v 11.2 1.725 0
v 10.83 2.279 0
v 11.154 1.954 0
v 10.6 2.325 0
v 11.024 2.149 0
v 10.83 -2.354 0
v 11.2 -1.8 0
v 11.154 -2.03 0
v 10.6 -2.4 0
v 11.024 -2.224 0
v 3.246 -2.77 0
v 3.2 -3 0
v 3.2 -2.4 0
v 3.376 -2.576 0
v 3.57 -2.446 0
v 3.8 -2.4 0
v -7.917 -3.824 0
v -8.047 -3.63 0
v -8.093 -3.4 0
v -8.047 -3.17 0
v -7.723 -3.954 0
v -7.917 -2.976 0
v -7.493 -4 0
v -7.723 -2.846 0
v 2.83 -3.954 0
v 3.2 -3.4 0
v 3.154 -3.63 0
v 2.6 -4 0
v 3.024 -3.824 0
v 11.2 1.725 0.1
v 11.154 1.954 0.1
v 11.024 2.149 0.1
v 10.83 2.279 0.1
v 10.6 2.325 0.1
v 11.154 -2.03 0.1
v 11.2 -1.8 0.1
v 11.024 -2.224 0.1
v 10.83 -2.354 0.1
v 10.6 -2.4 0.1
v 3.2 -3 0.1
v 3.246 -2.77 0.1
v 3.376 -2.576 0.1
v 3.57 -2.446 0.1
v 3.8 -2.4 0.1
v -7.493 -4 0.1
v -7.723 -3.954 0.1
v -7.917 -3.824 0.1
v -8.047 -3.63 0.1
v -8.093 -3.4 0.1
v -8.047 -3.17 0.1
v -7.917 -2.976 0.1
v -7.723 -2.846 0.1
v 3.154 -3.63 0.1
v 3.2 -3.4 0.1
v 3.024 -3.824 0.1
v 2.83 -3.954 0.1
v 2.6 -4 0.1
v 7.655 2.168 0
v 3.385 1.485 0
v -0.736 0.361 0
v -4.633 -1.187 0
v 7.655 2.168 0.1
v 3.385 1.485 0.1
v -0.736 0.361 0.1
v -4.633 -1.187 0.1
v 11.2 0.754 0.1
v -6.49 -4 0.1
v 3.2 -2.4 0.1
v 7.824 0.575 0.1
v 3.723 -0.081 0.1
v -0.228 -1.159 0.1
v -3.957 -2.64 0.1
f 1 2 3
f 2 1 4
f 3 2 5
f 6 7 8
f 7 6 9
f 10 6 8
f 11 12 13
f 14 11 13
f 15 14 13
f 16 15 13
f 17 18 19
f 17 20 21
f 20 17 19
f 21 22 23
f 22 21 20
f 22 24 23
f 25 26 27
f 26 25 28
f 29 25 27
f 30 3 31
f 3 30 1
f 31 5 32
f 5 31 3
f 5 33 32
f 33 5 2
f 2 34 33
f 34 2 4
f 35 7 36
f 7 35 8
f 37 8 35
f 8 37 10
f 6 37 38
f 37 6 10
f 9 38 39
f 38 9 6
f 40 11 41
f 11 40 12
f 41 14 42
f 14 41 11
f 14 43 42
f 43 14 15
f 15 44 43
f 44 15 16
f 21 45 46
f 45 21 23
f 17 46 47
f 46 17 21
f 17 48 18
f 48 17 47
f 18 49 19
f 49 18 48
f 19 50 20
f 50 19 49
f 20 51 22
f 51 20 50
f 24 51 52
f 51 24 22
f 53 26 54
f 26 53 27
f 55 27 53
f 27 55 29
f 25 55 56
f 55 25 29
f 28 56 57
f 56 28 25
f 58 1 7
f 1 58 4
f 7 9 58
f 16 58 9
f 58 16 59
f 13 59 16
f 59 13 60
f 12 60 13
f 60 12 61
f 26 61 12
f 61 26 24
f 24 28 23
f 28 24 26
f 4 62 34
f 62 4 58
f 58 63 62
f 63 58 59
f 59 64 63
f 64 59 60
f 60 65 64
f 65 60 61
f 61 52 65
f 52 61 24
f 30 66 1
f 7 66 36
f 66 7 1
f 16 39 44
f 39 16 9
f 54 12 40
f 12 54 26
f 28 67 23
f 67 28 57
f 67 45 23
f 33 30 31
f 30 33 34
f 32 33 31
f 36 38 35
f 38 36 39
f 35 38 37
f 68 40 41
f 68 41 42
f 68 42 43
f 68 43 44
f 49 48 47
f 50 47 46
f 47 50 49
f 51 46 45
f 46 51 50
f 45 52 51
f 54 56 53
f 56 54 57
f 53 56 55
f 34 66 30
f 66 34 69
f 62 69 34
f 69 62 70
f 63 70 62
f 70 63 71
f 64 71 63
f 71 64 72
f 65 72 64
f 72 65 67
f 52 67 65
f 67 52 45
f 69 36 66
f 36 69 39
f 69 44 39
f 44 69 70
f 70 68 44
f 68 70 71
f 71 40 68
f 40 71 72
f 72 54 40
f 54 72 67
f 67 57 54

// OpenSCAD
// file: ../p/7-16cyli.scad
use <../lib.scad>
function ldraw_lib__7_16cyli() = [
// 0 Cylinder 0.4375
// 0 Name: 7-16cyli.dat
// 0 Author: Magnus Forsberg [MagFors]
// 0 !LDRAW_ORG Primitive UPDATE 2024-01
// 0 !LICENSE Licensed under CC BY 4.0 : see CAreadme.txt
// 
// 0 BFC CERTIFY CCW
  [0,"BFC","CERTIFY"],
  [0,"BFC","CCW"],
// 
// 0 !HISTORY 2009-05-02 [PTadmin] Official Update 2009-01
// 0 !HISTORY 2024-01-03 [MagFors] Complete regeneration, original by guyvivan
// 0 !HISTORY 2024-01-29 [OrionP] Official Update 2024-01
// 
// 4 16 0.9239 0 0.3827 1 0 0 1 1 0 0.9239 1 0.3827
  [4,16,0.9239,0,0.3827,1,0,0,1,1,0,0.9239,1,0.3827],
// 4 16 0.7071 0 0.7071 0.9239 0 0.3827 0.9239 1 0.3827 0.7071 1 0.7071
  [4,16,0.7071,0,0.7071,0.9239,0,0.3827,0.9239,1,0.3827,0.7071,1,0.7071],
// 4 16 0.3827 0 0.9239 0.7071 0 0.7071 0.7071 1 0.7071 0.3827 1 0.9239
  [4,16,0.3827,0,0.9239,0.7071,0,0.7071,0.7071,1,0.7071,0.3827,1,0.9239],
// 4 16 0 0 1 0.3827 0 0.9239 0.3827 1 0.9239 0 1 1
  [4,16,0,0,1,0.3827,0,0.9239,0.3827,1,0.9239,0,1,1],
// 4 16 -0.3827 0 0.9239 0 0 1 0 1 1 -0.3827 1 0.9239
  [4,16,-0.3827,0,0.9239,0,0,1,0,1,1,-0.3827,1,0.9239],
// 4 16 -0.7071 0 0.7071 -0.3827 0 0.9239 -0.3827 1 0.9239 -0.7071 1 0.7071
  [4,16,-0.7071,0,0.7071,-0.3827,0,0.9239,-0.3827,1,0.9239,-0.7071,1,0.7071],
// 4 16 -0.9239 0 0.3827 -0.7071 0 0.7071 -0.7071 1 0.7071 -0.9239 1 0.3827
  [4,16,-0.9239,0,0.3827,-0.7071,0,0.7071,-0.7071,1,0.7071,-0.9239,1,0.3827],
// 0 // conditional lines
// 5 24 1 1 0 1 0 0 1 1 -0.4142 0.9239 1 0.3827
  [5,24,1,1,0,1,0,0,1,1,-0.4142,0.9239,1,0.3827],
// 5 24 0.9239 1 0.3827 0.9239 0 0.3827 1 1 0 0.7071 1 0.7071
  [5,24,0.9239,1,0.3827,0.9239,0,0.3827,1,1,0,0.7071,1,0.7071],
// 5 24 0.7071 1 0.7071 0.7071 0 0.7071 0.9239 1 0.3827 0.3827 1 0.9239
  [5,24,0.7071,1,0.7071,0.7071,0,0.7071,0.9239,1,0.3827,0.3827,1,0.9239],
// 5 24 0.3827 1 0.9239 0.3827 0 0.9239 0.7071 1 0.7071 0 1 1
  [5,24,0.3827,1,0.9239,0.3827,0,0.9239,0.7071,1,0.7071,0,1,1],
// 5 24 0 1 1 0 0 1 0.3827 1 0.9239 -0.3827 1 0.9239
  [5,24,0,1,1,0,0,1,0.3827,1,0.9239,-0.3827,1,0.9239],
// 5 24 -0.3827 1 0.9239 -0.3827 0 0.9239 0 1 1 -0.7071 1 0.7071
  [5,24,-0.3827,1,0.9239,-0.3827,0,0.9239,0,1,1,-0.7071,1,0.7071],
// 5 24 -0.7071 1 0.7071 -0.7071 0 0.7071 -0.3827 1 0.9239 -0.9239 1 0.3827
  [5,24,-0.7071,1,0.7071,-0.7071,0,0.7071,-0.3827,1,0.9239,-0.9239,1,0.3827],
// 5 24 -0.9239 1 0.3827 -0.9239 0 0.3827 -0.7071 1 0.7071 -1.0824 1 0
  [5,24,-0.9239,1,0.3827,-0.9239,0,0.3827,-0.7071,1,0.7071,-1.0824,1,0],
// 0 // Build by LDPartEditor (PrimGen 2.X)
];
module ldraw_lib__7_16cyli(step=0, col=false, unit=2/5, alt=false, line=0.2, solid=!$preview)
    makepoly(ldraw_lib__7_16cyli(), step=step, col=col, unit=unit, alt=alt, line=line, solid=solid);
ldraw_lib__7_16cyli(line=0.2);
// file: ../p/1-4cyli.scad
use <../lib.scad>
function ldraw_lib__1_4cyli() = [
// 0 Cylinder 0.25
// 0 Name: 1-4cyli.dat
// 0 Author: James Jessiman
// 0 !LDRAW_ORG Primitive UPDATE 2012-01
// 0 !LICENSE Licensed under CC BY 4.0 : see CAreadme.txt
// 
// 0 BFC CERTIFY CCW
  [0,"BFC","CERTIFY"],
  [0,"BFC","CCW"],
// 
// 0 !HISTORY 2002-03-23 [sbliss] Added BFC statement.
// 0 !HISTORY 2002-04-25 [PTadmin] Official Update 2002-02
// 0 !HISTORY 2007-06-22 [PTadmin] Header formatted for Contributor Agreement
// 0 !HISTORY 2008-07-01 [PTadmin] Official Update 2008-01
// 0 !HISTORY 2012-02-16 [Philo] Changed to CCW
// 0 !HISTORY 2012-03-30 [PTadmin] Official Update 2012-01
// 
// 
// 4 16 1 1 0 0.9239 1 0.3827 0.9239 0 0.3827 1 0 0
  [4,16,1,1,0,0.9239,1,0.3827,0.9239,0,0.3827,1,0,0],
// 5 24 1 0 0 1 1 0 0.9239 0 0.3827 1 0 -1
  [5,24,1,0,0,1,1,0,0.9239,0,0.3827,1,0,-1],
// 4 16 0.9239 1 0.3827 0.7071 1 0.7071 0.7071 0 0.7071 0.9239 0 0.3827
  [4,16,0.9239,1,0.3827,0.7071,1,0.7071,0.7071,0,0.7071,0.9239,0,0.3827],
// 5 24 0.9239 0 0.3827 0.9239 1 0.3827 0.7071 0 0.7071 1 0 0
  [5,24,0.9239,0,0.3827,0.9239,1,0.3827,0.7071,0,0.7071,1,0,0],
// 4 16 0.7071 1 0.7071 0.3827 1 0.9239 0.3827 0 0.9239 0.7071 0 0.7071
  [4,16,0.7071,1,0.7071,0.3827,1,0.9239,0.3827,0,0.9239,0.7071,0,0.7071],
// 5 24 0.7071 0 0.7071 0.7071 1 0.7071 0.3827 0 0.9239 0.9239 0 0.3827
  [5,24,0.7071,0,0.7071,0.7071,1,0.7071,0.3827,0,0.9239,0.9239,0,0.3827],
// 4 16 0.3827 1 0.9239 0 1 1 0 0 1 0.3827 0 0.9239
  [4,16,0.3827,1,0.9239,0,1,1,0,0,1,0.3827,0,0.9239],
// 5 24 0.3827 0 0.9239 0.3827 1 0.9239 0 0 1 0.7071 0 0.7071
  [5,24,0.3827,0,0.9239,0.3827,1,0.9239,0,0,1,0.7071,0,0.7071],
// 5 24 0 0 1 0 1 1 0.3827 0 0.9239 -1 0 1
  [5,24,0,0,1,0,1,1,0.3827,0,0.9239,-1,0,1],
];
module ldraw_lib__1_4cyli(step=0, col=false, unit=2/5, alt=false, line=0.2, solid=!$preview)
    makepoly(ldraw_lib__1_4cyli(), step=step, col=col, unit=unit, alt=alt, line=line, solid=solid);
ldraw_lib__1_4cyli(line=0.2);
// file: ../p/7-16chrd.scad
use <../lib.scad>
function ldraw_lib__7_16chrd() = [
// 0 Chord 0.4375
// 0 Name: 7-16chrd.dat
// 0 Author: Willy Tschager [Holly-Wood]
// 0 !LDRAW_ORG Primitive UPDATE 2024-01
// 0 !LICENSE Licensed under CC BY 4.0 : see CAreadme.txt
// 
// 0 BFC CERTIFY CCW
  [0,"BFC","CERTIFY"],
  [0,"BFC","CCW"],
// 
// 0 !HISTORY 2009-12-29 [PTadmin] Official Update 2009-03
// 0 !HISTORY 2024-01-10 [Holly-Wood] Complete re-write, original by guyvivan
// 0 !HISTORY 2024-01-29 [OrionP] Official Update 2024-01
// 
// 4 16 -.7071 0 .7071 -.9239 0 .3827 1 0 0 .9239 0 .3827
  [4,16,-.7071,0,.7071,-.9239,0,.3827,1,0,0,.9239,0,.3827],
// 4 16 -.7071 0 .7071 .9239 0 .3827 .7071 0 .7071 -.3827 0 .9239
  [4,16,-.7071,0,.7071,.9239,0,.3827,.7071,0,.7071,-.3827,0,.9239],
// 4 16 -.3827 0 .9239 .7071 0 .7071 .3827 0 .9239 0 0 1
  [4,16,-.3827,0,.9239,.7071,0,.7071,.3827,0,.9239,0,0,1],
// 0 // Based on LDPartEditor (PrimGen 2.X)
];
module ldraw_lib__7_16chrd(step=0, col=false, unit=2/5, alt=false, line=0.2, solid=!$preview)
    makepoly(ldraw_lib__7_16chrd(), step=step, col=col, unit=unit, alt=alt, line=line, solid=solid);
ldraw_lib__7_16chrd(line=0.2);
// file: ../p/1-4ndis.scad
use <../lib.scad>
function ldraw_lib__1_4ndis() = [
// 0 Disc Negative 0.25
// 0 Name: 1-4ndis.dat
// 0 Author: James Jessiman
// 0 !LDRAW_ORG Primitive UPDATE 2012-01
// 0 !LICENSE Licensed under CC BY 4.0 : see CAreadme.txt
// 
// 0 BFC CERTIFY CCW
  [0,"BFC","CERTIFY"],
  [0,"BFC","CCW"],
// 
// 0 !HISTORY 2002-03-23 [sbliss] Added BFC Statement
// 0 !HISTORY 2002-04-25 [PTadmin] Official Update 2002-02
// 0 !HISTORY 2007-06-22 [PTadmin] Header formatted for Contributor Agreement
// 0 !HISTORY 2008-07-01 [PTadmin] Official Update 2008-01
// 0 !HISTORY 2012-02-16 [Philo] Changed to CCW
// 0 !HISTORY 2012-03-30 [PTadmin] Official Update 2012-01
// 
// 
// 3 16 0.9239 0 0.3827 1 0 0 1 0 1
  [3,16,0.9239,0,0.3827,1,0,0,1,0,1],
// 3 16 0.7071 0 0.7071 0.9239 0 0.3827 1 0 1
  [3,16,0.7071,0,0.7071,0.9239,0,0.3827,1,0,1],
// 3 16 0.3827 0 0.9239 0.7071 0 0.7071 1 0 1
  [3,16,0.3827,0,0.9239,0.7071,0,0.7071,1,0,1],
// 3 16 0 0 1 0.3827 0 0.9239 1 0 1
  [3,16,0,0,1,0.3827,0,0.9239,1,0,1],
];
module ldraw_lib__1_4ndis(step=0, col=false, unit=2/5, alt=false, line=0.2, solid=!$preview)
    makepoly(ldraw_lib__1_4ndis(), step=step, col=col, unit=unit, alt=alt, line=line, solid=solid);
ldraw_lib__1_4ndis(line=0.2);
// file: ../p/1-4chrd.scad
use <../lib.scad>
function ldraw_lib__1_4chrd() = [
// 0 Chord 0.25
// 0 Name: 1-4chrd.dat
// 0 Author: Max Martin Richter [MMR1988]
// 0 !LDRAW_ORG Primitive UPDATE 2023-05
// 0 !LICENSE Licensed under CC BY 4.0 : see CAreadme.txt
// 
// 0 BFC CERTIFY CCW
  [0,"BFC","CERTIFY"],
  [0,"BFC","CCW"],
// 
// 0 !HISTORY 2004-04-22 [PTadmin] Official Update 2004-02
// 0 !HISTORY 2007-10-09 [PTadmin] Header formatted for Contributor Agreement
// 0 !HISTORY 2008-07-01 [PTadmin] Official Update 2008-01
// 0 !HISTORY 2012-08-02 [MMR1988] Re-creation with PrimGen2 and Rectifier
// 0 !HISTORY 2012-08-09 [PTadmin] Official Update 2012-02
// 0 !HISTORY 2023-10-27 [OrionP] Change author to MMR1988 from hafhead
// 0 !HISTORY 2023-10-31 [OrionP] Official Update 2023-05
// 
// 4 16 0.9239 0 0.3827 0.3827 0 0.9239 0 0 1 1 0 0
  [4,16,0.9239,0,0.3827,0.3827,0,0.9239,0,0,1,1,0,0],
// 3 16 0.7071 0 0.7071 0.3827 0 0.9239 0.9239 0 0.3827
  [3,16,0.7071,0,0.7071,0.3827,0,0.9239,0.9239,0,0.3827],
];
module ldraw_lib__1_4chrd(step=0, col=false, unit=2/5, alt=false, line=0.2, solid=!$preview)
    makepoly(ldraw_lib__1_4chrd(), step=step, col=col, unit=unit, alt=alt, line=line, solid=solid);
ldraw_lib__1_4chrd(line=0.2);
// file: s/stickerback008x024a.scad
use <../../lib.scad>
use <../../p/1-4chrd.scad>
use <../../p/1-4cyli.scad>
use <../../p/1-4ndis.scad>
use <../../p/7-16chrd.scad>
use <../../p/7-16cyli.scad>
function ldraw_lib__s__stickerback008x024a() = [
// 0 ~Sticker Back  0.8 x  2.4 for Side of Slope Brick Curved  3 x  1
// 0 Name: s\stickerback008x024a.dat
// 0 Author: Massimo Maso [Sirio]
// 0 !LDRAW_ORG Subpart UPDATE 2026-05
// 0 !LICENSE Licensed under CC BY 4.0 : see CAreadme.txt
// 
// 0 !HELP This is a stickerback, but it doesn't cover all the side of the 50950
// 
// 0 BFC CERTIFY CCW
  [0,"BFC","CERTIFY"],
  [0,"BFC","CCW"],
// 
// 0 !HISTORY 2026-05-31 [OrionP] Official Update 2026-05
// 
// 0 // Primitives
// 1 16 -26.5 0 4.3116 -1.5 0 0 0 -1 0 0 0 1.5 1-4chrd.dat
  [1,16,-26.5,0,4.3116,-1.5,0,0,0,-1,0,0,0,1.5, ldraw_lib__1_4chrd()],
// 1 16 -26.5 0 -4.5 -1.5 0 0 0 -1 0 0 0 -1.5 1-4chrd.dat
  [1,16,-26.5,0,-4.5,-1.5,0,0,0,-1,0,0,0,-1.5, ldraw_lib__1_4chrd()],
// 1 16 -9.5 0 -7.5 1.5 0 0 0 -1 0 0 0 1.5 1-4ndis.dat
  [1,16,-9.5,0,-7.5,1.5,0,0,0,-1,0,0,0,1.5, ldraw_lib__1_4ndis()],
// 1 16 18.7325 0 -8.5 0 0 1.5 0 -1 0 -1.5 0 0 7-16chrd.dat
  [1,16,18.7325,0,-8.5,0,0,1.5,0,-1,0,-1.5,0,0, ldraw_lib__7_16chrd()],
// 1 16 -6.5 0 -8.5 -1.5 0 0 0 -1 0 0 0 -1.5 1-4chrd.dat
  [1,16,-6.5,0,-8.5,-1.5,0,0,0,-1,0,0,0,-1.5, ldraw_lib__1_4chrd()],
// 1 16 -26.5 0 4.3116 -1.5 0 0 0 -.25 0 0 0 1.5 1-4cyli.dat
  [1,16,-26.5,0,4.3116,-1.5,0,0,0,-.25,0,0,0,1.5, ldraw_lib__1_4cyli()],
// 1 16 -26.5 0 -4.5 -1.5 0 0 0 -.25 0 0 0 -1.5 1-4cyli.dat
  [1,16,-26.5,0,-4.5,-1.5,0,0,0,-.25,0,0,0,-1.5, ldraw_lib__1_4cyli()],
// 0 BFC INVERTNEXT
  [0,"BFC","INVERTNEXT"],
// 1 16 -9.5 0 -7.5 1.5 0 0 0 -.25 0 0 0 1.5 1-4cyli.dat
  [1,16,-9.5,0,-7.5,1.5,0,0,0,-.25,0,0,0,1.5, ldraw_lib__1_4cyli()],
// 1 16 18.7325 0 -8.5 0 0 1.5 0 -.25 0 -1.5 0 0 7-16cyli.dat
  [1,16,18.7325,0,-8.5,0,0,1.5,0,-.25,0,-1.5,0,0, ldraw_lib__7_16cyli()],
// 1 16 -6.5 0 -8.5 -1.5 0 0 0 -.25 0 0 0 -1.5 1-4cyli.dat
  [1,16,-6.5,0,-8.5,-1.5,0,0,0,-.25,0,0,0,-1.5, ldraw_lib__1_4cyli()],
// 0 // Bottom faces
// 4 16 -19.1381 0 5.4212 -28 0 -4.5 -28 0 4.3116 -26.5 0 5.8116
  [4,16,-19.1381,0,5.4212,-28,0,-4.5,-28,0,4.3116,-26.5,0,5.8116],
// 3 16 -19.1381 0 5.4212 -26.5 0 -6 -28 0 -4.5
  [3,16,-19.1381,0,5.4212,-26.5,0,-6,-28,0,-4.5],
// 4 16 -19.1381 0 5.4212 -8.4622 0 3.7137 -9.5 0 -6 -26.5 0 -6
  [4,16,-19.1381,0,5.4212,-8.4622,0,3.7137,-9.5,0,-6,-26.5,0,-6],
// 4 16 1.8392 0 .9037 -8 0 -6 -9.5 0 -6 -8.4622 0 3.7137
  [4,16,1.8392,0,.9037,-8,0,-6,-9.5,0,-6,-8.4622,0,3.7137],
// 4 16 1.8392 0 .9037 11.5818 0 -2.9663 -8 0 -7.5 -8 0 -6
  [4,16,1.8392,0,.9037,11.5818,0,-2.9663,-8,0,-7.5,-8,0,-6],
// 4 16 -8 0 -8.5 -8 0 -7.5 11.5818 0 -2.9663 19.30655 0 -7.11415
  [4,16,-8,0,-8.5,-8,0,-7.5,11.5818,0,-2.9663,19.30655,0,-7.11415],
// 4 16 -8 0 -8.5 19.30655 0 -7.11415 18.7325 0 -10 -6.5 0 -10
  [4,16,-8,0,-8.5,19.30655,0,-7.11415,18.7325,0,-10,-6.5,0,-10],
// 0 // Lateral faces
// 4 16 -19.1381 0 5.4212 -26.5 0 5.8116 -26.5 -.25 5.8116 -19.1381 -.25 5.4212
  [4,16,-19.1381,0,5.4212,-26.5,0,5.8116,-26.5,-.25,5.8116,-19.1381,-.25,5.4212],
// 4 16 -19.1381 0 5.4212 -19.1381 -.25 5.4212 -8.4622 -.25 3.7137 -8.4622 0 3.7137
  [4,16,-19.1381,0,5.4212,-19.1381,-.25,5.4212,-8.4622,-.25,3.7137,-8.4622,0,3.7137],
// 4 16 1.8392 0 .9037 -8.4622 0 3.7137 -8.4622 -.25 3.7137 1.8392 -.25 .9037
  [4,16,1.8392,0,.9037,-8.4622,0,3.7137,-8.4622,-.25,3.7137,1.8392,-.25,.9037],
// 4 16 1.8392 0 .9037 1.8392 -.25 .9037 11.5818 -.25 -2.9663 11.5818 0 -2.9663
  [4,16,1.8392,0,.9037,1.8392,-.25,.9037,11.5818,-.25,-2.9663,11.5818,0,-2.9663],
// 4 16 19.30655 0 -7.11415 11.5818 0 -2.9663 11.5818 -.25 -2.9663 19.30655 -.25 -7.11415
  [4,16,19.30655,0,-7.11415,11.5818,0,-2.9663,11.5818,-.25,-2.9663,19.30655,-.25,-7.11415],
// 3 16 -28 0 4.3116 -28 -.25 1.8855 -28 -.25 4.3116
  [3,16,-28,0,4.3116,-28,-.25,1.8855,-28,-.25,4.3116],
// 4 16 -28 0 4.3116 -28 0 -4.5 -28 -.25 -4.5 -28 -.25 1.8855
  [4,16,-28,0,4.3116,-28,0,-4.5,-28,-.25,-4.5,-28,-.25,1.8855],
// 4 16 -26.5 0 -6 -9.5 0 -6 -9.5 -.25 -6 -26.5 -.25 -6
  [4,16,-26.5,0,-6,-9.5,0,-6,-9.5,-.25,-6,-26.5,-.25,-6],
// 4 16 -8 0 -7.5 -8 0 -8.5 -8 -.25 -8.5 -8 -.25 -7.5
  [4,16,-8,0,-7.5,-8,0,-8.5,-8,-.25,-8.5,-8,-.25,-7.5],
// 4 16 18.7325 0 -10 16.2256 -.25 -10 -6.5 -.25 -10 -6.5 0 -10
  [4,16,18.7325,0,-10,16.2256,-.25,-10,-6.5,-.25,-10,-6.5,0,-10],
// 3 16 18.7325 0 -10 18.7325 -.25 -10 16.2256 -.25 -10
  [3,16,18.7325,0,-10,18.7325,-.25,-10,16.2256,-.25,-10],
// 0 // Conditional lines
// 5 24 -26.5 0 5.8116 -26.5 -.25 5.8116 -19.1381 0 5.4212 -27.07405 0 5.69745
  [5,24,-26.5,0,5.8116,-26.5,-.25,5.8116,-19.1381,0,5.4212,-27.07405,0,5.69745],
// 5 24 -19.1381 0 5.4212 -19.1381 -.25 5.4212 -8.4622 0 3.7137 -26.5 0 5.8116
  [5,24,-19.1381,0,5.4212,-19.1381,-.25,5.4212,-8.4622,0,3.7137,-26.5,0,5.8116],
// 5 24 -8.4622 0 3.7137 -8.4622 -.25 3.7137 1.8392 0 .9037 -19.1381 0 5.4212
  [5,24,-8.4622,0,3.7137,-8.4622,-.25,3.7137,1.8392,0,.9037,-19.1381,0,5.4212],
// 5 24 1.8392 0 .9037 1.8392 -.25 .9037 11.5818 0 -2.9663 -8.4622 0 3.7137
  [5,24,1.8392,0,.9037,1.8392,-.25,.9037,11.5818,0,-2.9663,-8.4622,0,3.7137],
// 5 24 11.5818 0 -2.9663 11.5818 -.25 -2.9663 19.30655 0 -7.11415 1.8392 0 .9037
  [5,24,11.5818,0,-2.9663,11.5818,-.25,-2.9663,19.30655,0,-7.11415,1.8392,0,.9037],
// 5 24 19.30655 0 -7.11415 19.30655 -.25 -7.11415 19.79315 0 -7.43935 11.5818 0 -2.9663
  [5,24,19.30655,0,-7.11415,19.30655,-.25,-7.11415,19.79315,0,-7.43935,11.5818,0,-2.9663],
];
module ldraw_lib__s__stickerback008x024a(step=0, col=false, unit=2/5, alt=false, line=0.2, solid=!$preview)
    makepoly(ldraw_lib__s__stickerback008x024a(), step=step, col=col, unit=unit, alt=alt, line=line, solid=solid);
ldraw_lib__s__stickerback008x024a(line=0.2);
// file: s/6221655ads02.scad
use <../../lib.scad>
use <../../p/1-4chrd.scad>
use <../../p/1-4ndis.scad>
use <../../p/7-16chrd.scad>
function ldraw_lib__s__6221655ads02() = [
// 0 ~Sticker  0.8 x  2.4 with Black Curved Stripe on Lime Background Right - Top Face
// 0 Name: s\6221655ads02.dat
// 0 Author: Massimo Maso [Sirio]
// 0 !LDRAW_ORG Subpart UPDATE 2026-05
// 0 !LICENSE Licensed under CC BY 4.0 : see CAreadme.txt
// 
// 0 !HELP Stickers' geometry in common with set 75895 (sheet 6285381)
// 
// 0 BFC CERTIFY CCW
  [0,"BFC","CERTIFY"],
  [0,"BFC","CCW"],
// 
// 0 !HISTORY 2024-10-27 [OrionP] Official Update 2024-09
// 0 !HISTORY 2025-11-17 [Sirio] Adapted to new 50950 geometry
// 0 !HISTORY 2026-05-31 [OrionP] Official Update 2026-05
// 
// 0 // Primitives
// 1 0 -26.5 -.25 4.3116 -1.5 0 0 0 1 0 0 0 1.5 1-4chrd.dat
  [1,0,-26.5,-.25,4.3116,-1.5,0,0,0,1,0,0,0,1.5, ldraw_lib__1_4chrd()],
// 1 16 -26.5 -.25 -4.5 -1.5 0 0 0 1 0 0 0 -1.5 1-4chrd.dat
  [1,16,-26.5,-.25,-4.5,-1.5,0,0,0,1,0,0,0,-1.5, ldraw_lib__1_4chrd()],
// 1 16 -9.5 -.25 -7.5 1.5 0 0 0 1 0 0 0 1.5 1-4ndis.dat
  [1,16,-9.5,-.25,-7.5,1.5,0,0,0,1,0,0,0,1.5, ldraw_lib__1_4ndis()],
// 1 0 18.7325 -.25 -8.5 0 0 1.5 0 1 0 -1.5 0 0 7-16chrd.dat
  [1,0,18.7325,-.25,-8.5,0,0,1.5,0,1,0,-1.5,0,0, ldraw_lib__7_16chrd()],
// 1 16 -6.5 -.25 -8.5 -1.5 0 0 0 1 0 0 0 -1.5 1-4chrd.dat
  [1,16,-6.5,-.25,-8.5,-1.5,0,0,0,1,0,0,0,-1.5, ldraw_lib__1_4chrd()],
// 0 // Black faces
// 4 0 -19.5611 -.25 1.438 -26.5 -.25 5.8116 -28 -.25 4.3116 -28 -.25 1.8855
  [4,0,-19.5611,-.25,1.438,-26.5,-.25,5.8116,-28,-.25,4.3116,-28,-.25,1.8855],
// 4 0 -19.5611 -.25 1.438 -9.3068 -.25 -.202 -19.1381 -.25 5.4212 -26.5 -.25 5.8116
  [4,0,-19.5611,-.25,1.438,-9.3068,-.25,-.202,-19.1381,-.25,5.4212,-26.5,-.25,5.8116],
// 4 0 .5706 -.25 -2.8964 -8.4622 -.25 3.7137 -19.1381 -.25 5.4212 -9.3068 -.25 -.202
  [4,0,.5706,-.25,-2.8964,-8.4622,-.25,3.7137,-19.1381,-.25,5.4212,-9.3068,-.25,-.202],
// 4 0 .5706 -.25 -2.8964 9.8918 -.25 -6.599 1.8392 -.25 .9037 -8.4622 -.25 3.7137
  [4,0,.5706,-.25,-2.8964,9.8918,-.25,-6.599,1.8392,-.25,.9037,-8.4622,-.25,3.7137],
// 4 0 16.2256 -.25 -10 11.5818 -.25 -2.9663 1.8392 -.25 .9037 9.8918 -.25 -6.599
  [4,0,16.2256,-.25,-10,11.5818,-.25,-2.9663,1.8392,-.25,.9037,9.8918,-.25,-6.599],
// 4 0 16.2256 -.25 -10 18.7325 -.25 -10 19.30655 -.25 -7.11415 11.5818 -.25 -2.9663
  [4,0,16.2256,-.25,-10,18.7325,-.25,-10,19.30655,-.25,-7.11415,11.5818,-.25,-2.9663],
// 0 // Green faces
// 4 16 -26.5 -.25 -6 -19.5611 -.25 1.438 -28 -.25 1.8855 -28 -.25 -4.5
  [4,16,-26.5,-.25,-6,-19.5611,-.25,1.438,-28,-.25,1.8855,-28,-.25,-4.5],
// 4 16 -26.5 -.25 -6 -9.5 -.25 -6 -9.3068 -.25 -.202 -19.5611 -.25 1.438
  [4,16,-26.5,-.25,-6,-9.5,-.25,-6,-9.3068,-.25,-.202,-19.5611,-.25,1.438],
// 4 16 -8 -.25 -6 .5706 -.25 -2.8964 -9.3068 -.25 -.202 -9.5 -.25 -6
  [4,16,-8,-.25,-6,.5706,-.25,-2.8964,-9.3068,-.25,-.202,-9.5,-.25,-6],
// 4 16 -8 -.25 -6 -8 -.25 -7.5 9.8918 -.25 -6.599 .5706 -.25 -2.8964
  [4,16,-8,-.25,-6,-8,-.25,-7.5,9.8918,-.25,-6.599,.5706,-.25,-2.8964],
// 4 16 -8 -.25 -8.5 16.2256 -.25 -10 9.8918 -.25 -6.599 -8 -.25 -7.5
  [4,16,-8,-.25,-8.5,16.2256,-.25,-10,9.8918,-.25,-6.599,-8,-.25,-7.5],
// 3 16 -8 -.25 -8.5 -6.5 -.25 -10 16.2256 -.25 -10
  [3,16,-8,-.25,-8.5,-6.5,-.25,-10,16.2256,-.25,-10],
];
module ldraw_lib__s__6221655ads02(step=0, col=false, unit=2/5, alt=false, line=0.2, solid=!$preview)
    makepoly(ldraw_lib__s__6221655ads02(), step=step, col=col, unit=unit, alt=alt, line=line, solid=solid);
ldraw_lib__s__6221655ads02(line=0.2);
// file: 6221655ad.scad
use <../lib.scad>
use <s/6221655ads02.scad>
use <s/stickerback008x024a.scad>
function ldraw_lib__6221655ad() = [
// 0 Sticker  0.8 x  2.4 with Black Curved Stripe on Lime Background Right
// 0 Name: 6221655ad.dat
// 0 Author: Massimo Maso [Sirio]
// 0 !LDRAW_ORG Part UPDATE 2026-05
// 0 !LICENSE Licensed under CC BY 4.0 : see CAreadme.txt
// 
// 0 !HELP Stickers' geometry in common with set 75895 (sheet 6285381)
// 
// 0 BFC CERTIFY CCW
  [0,"BFC","CERTIFY"],
  [0,"BFC","CCW"],
// 
// 0 !KEYWORDS 3.0, 911 RSR, Bricklink 75888stk01, Brickowl 925236, bumper, front
// 0 !KEYWORDS Porsche, Rebrickable 37801, Set 75888, Speed Champions, Turbo
// 
// 0 !HISTORY 2024-10-27 [OrionP] Official Update 2024-09
// 0 !HISTORY 2025-11-17 [Sirio] Adapted to new 50950 geometry; subparted for use in set 75895
// 0 !HISTORY 2026-05-31 [OrionP] Official Update 2026-05
// 
// 1 16 0 0 0 1 0 0 0 1 0 0 0 1 s\stickerback008x024a.dat
  [1,16,0,0,0,1,0,0,0,1,0,0,0,1, ldraw_lib__s__stickerback008x024a()],
// 1 27 0 0 0 1 0 0 0 1 0 0 0 1 s\6221655ads02.dat
  [1,27,0,0,0,1,0,0,0,1,0,0,0,1, ldraw_lib__s__6221655ads02()],
];
module ldraw_lib__6221655ad(step=0, col=false, unit=2/5, alt=false, line=0.2, solid=!$preview)
    makepoly(ldraw_lib__6221655ad(), step=step, col=col, unit=unit, alt=alt, line=line, solid=solid);
ldraw_lib__6221655ad(line=0.2);
// main file
use <../lib.scad>
use <6221655ad.scad>
function ldraw_lib__6221655af() = [
// 0 Sticker  0.8 x  2.4 with Black Curved Stripe on Lime Background Left
// 0 Name: 6221655af.dat
// 0 Author: Massimo Maso [Sirio]
// 0 !LDRAW_ORG Part UPDATE 2026-05
// 0 !LICENSE Licensed under CC BY 4.0 : see CAreadme.txt
// 
// 0 !HELP Stickers' geometry in common with set 75895 (sheet 6285381)
// 
// 0 BFC CERTIFY CCW
  [0,"BFC","CERTIFY"],
  [0,"BFC","CCW"],
// 
// 0 !KEYWORDS 3.0, 911 RSR, Bricklink 75888stk01, Brickowl 925236, bumper, front
// 0 !KEYWORDS Porsche, Rebrickable 37801, Set 75888, Speed Champions, Turbo
// 
// 0 !HISTORY 2024-10-27 [OrionP] Official Update 2024-09
// 0 !HISTORY 2026-05-31 [OrionP] Official Update 2026-05
// 
// 1 16 0 0 0 -1 0 0 0 1 0 0 0 1 6221655ad.dat
  [1,16,0,0,0,-1,0,0,0,1,0,0,0,1, ldraw_lib__6221655ad()],
];
module ldraw_lib__6221655af(step=0, col=false, unit=2/5, alt=false, line=0.2, solid=!$preview)
    makepoly(ldraw_lib__6221655af(), step=step, col=col, unit=unit, alt=alt, line=line, solid=solid);
ldraw_lib__6221655af(line=0.2);
